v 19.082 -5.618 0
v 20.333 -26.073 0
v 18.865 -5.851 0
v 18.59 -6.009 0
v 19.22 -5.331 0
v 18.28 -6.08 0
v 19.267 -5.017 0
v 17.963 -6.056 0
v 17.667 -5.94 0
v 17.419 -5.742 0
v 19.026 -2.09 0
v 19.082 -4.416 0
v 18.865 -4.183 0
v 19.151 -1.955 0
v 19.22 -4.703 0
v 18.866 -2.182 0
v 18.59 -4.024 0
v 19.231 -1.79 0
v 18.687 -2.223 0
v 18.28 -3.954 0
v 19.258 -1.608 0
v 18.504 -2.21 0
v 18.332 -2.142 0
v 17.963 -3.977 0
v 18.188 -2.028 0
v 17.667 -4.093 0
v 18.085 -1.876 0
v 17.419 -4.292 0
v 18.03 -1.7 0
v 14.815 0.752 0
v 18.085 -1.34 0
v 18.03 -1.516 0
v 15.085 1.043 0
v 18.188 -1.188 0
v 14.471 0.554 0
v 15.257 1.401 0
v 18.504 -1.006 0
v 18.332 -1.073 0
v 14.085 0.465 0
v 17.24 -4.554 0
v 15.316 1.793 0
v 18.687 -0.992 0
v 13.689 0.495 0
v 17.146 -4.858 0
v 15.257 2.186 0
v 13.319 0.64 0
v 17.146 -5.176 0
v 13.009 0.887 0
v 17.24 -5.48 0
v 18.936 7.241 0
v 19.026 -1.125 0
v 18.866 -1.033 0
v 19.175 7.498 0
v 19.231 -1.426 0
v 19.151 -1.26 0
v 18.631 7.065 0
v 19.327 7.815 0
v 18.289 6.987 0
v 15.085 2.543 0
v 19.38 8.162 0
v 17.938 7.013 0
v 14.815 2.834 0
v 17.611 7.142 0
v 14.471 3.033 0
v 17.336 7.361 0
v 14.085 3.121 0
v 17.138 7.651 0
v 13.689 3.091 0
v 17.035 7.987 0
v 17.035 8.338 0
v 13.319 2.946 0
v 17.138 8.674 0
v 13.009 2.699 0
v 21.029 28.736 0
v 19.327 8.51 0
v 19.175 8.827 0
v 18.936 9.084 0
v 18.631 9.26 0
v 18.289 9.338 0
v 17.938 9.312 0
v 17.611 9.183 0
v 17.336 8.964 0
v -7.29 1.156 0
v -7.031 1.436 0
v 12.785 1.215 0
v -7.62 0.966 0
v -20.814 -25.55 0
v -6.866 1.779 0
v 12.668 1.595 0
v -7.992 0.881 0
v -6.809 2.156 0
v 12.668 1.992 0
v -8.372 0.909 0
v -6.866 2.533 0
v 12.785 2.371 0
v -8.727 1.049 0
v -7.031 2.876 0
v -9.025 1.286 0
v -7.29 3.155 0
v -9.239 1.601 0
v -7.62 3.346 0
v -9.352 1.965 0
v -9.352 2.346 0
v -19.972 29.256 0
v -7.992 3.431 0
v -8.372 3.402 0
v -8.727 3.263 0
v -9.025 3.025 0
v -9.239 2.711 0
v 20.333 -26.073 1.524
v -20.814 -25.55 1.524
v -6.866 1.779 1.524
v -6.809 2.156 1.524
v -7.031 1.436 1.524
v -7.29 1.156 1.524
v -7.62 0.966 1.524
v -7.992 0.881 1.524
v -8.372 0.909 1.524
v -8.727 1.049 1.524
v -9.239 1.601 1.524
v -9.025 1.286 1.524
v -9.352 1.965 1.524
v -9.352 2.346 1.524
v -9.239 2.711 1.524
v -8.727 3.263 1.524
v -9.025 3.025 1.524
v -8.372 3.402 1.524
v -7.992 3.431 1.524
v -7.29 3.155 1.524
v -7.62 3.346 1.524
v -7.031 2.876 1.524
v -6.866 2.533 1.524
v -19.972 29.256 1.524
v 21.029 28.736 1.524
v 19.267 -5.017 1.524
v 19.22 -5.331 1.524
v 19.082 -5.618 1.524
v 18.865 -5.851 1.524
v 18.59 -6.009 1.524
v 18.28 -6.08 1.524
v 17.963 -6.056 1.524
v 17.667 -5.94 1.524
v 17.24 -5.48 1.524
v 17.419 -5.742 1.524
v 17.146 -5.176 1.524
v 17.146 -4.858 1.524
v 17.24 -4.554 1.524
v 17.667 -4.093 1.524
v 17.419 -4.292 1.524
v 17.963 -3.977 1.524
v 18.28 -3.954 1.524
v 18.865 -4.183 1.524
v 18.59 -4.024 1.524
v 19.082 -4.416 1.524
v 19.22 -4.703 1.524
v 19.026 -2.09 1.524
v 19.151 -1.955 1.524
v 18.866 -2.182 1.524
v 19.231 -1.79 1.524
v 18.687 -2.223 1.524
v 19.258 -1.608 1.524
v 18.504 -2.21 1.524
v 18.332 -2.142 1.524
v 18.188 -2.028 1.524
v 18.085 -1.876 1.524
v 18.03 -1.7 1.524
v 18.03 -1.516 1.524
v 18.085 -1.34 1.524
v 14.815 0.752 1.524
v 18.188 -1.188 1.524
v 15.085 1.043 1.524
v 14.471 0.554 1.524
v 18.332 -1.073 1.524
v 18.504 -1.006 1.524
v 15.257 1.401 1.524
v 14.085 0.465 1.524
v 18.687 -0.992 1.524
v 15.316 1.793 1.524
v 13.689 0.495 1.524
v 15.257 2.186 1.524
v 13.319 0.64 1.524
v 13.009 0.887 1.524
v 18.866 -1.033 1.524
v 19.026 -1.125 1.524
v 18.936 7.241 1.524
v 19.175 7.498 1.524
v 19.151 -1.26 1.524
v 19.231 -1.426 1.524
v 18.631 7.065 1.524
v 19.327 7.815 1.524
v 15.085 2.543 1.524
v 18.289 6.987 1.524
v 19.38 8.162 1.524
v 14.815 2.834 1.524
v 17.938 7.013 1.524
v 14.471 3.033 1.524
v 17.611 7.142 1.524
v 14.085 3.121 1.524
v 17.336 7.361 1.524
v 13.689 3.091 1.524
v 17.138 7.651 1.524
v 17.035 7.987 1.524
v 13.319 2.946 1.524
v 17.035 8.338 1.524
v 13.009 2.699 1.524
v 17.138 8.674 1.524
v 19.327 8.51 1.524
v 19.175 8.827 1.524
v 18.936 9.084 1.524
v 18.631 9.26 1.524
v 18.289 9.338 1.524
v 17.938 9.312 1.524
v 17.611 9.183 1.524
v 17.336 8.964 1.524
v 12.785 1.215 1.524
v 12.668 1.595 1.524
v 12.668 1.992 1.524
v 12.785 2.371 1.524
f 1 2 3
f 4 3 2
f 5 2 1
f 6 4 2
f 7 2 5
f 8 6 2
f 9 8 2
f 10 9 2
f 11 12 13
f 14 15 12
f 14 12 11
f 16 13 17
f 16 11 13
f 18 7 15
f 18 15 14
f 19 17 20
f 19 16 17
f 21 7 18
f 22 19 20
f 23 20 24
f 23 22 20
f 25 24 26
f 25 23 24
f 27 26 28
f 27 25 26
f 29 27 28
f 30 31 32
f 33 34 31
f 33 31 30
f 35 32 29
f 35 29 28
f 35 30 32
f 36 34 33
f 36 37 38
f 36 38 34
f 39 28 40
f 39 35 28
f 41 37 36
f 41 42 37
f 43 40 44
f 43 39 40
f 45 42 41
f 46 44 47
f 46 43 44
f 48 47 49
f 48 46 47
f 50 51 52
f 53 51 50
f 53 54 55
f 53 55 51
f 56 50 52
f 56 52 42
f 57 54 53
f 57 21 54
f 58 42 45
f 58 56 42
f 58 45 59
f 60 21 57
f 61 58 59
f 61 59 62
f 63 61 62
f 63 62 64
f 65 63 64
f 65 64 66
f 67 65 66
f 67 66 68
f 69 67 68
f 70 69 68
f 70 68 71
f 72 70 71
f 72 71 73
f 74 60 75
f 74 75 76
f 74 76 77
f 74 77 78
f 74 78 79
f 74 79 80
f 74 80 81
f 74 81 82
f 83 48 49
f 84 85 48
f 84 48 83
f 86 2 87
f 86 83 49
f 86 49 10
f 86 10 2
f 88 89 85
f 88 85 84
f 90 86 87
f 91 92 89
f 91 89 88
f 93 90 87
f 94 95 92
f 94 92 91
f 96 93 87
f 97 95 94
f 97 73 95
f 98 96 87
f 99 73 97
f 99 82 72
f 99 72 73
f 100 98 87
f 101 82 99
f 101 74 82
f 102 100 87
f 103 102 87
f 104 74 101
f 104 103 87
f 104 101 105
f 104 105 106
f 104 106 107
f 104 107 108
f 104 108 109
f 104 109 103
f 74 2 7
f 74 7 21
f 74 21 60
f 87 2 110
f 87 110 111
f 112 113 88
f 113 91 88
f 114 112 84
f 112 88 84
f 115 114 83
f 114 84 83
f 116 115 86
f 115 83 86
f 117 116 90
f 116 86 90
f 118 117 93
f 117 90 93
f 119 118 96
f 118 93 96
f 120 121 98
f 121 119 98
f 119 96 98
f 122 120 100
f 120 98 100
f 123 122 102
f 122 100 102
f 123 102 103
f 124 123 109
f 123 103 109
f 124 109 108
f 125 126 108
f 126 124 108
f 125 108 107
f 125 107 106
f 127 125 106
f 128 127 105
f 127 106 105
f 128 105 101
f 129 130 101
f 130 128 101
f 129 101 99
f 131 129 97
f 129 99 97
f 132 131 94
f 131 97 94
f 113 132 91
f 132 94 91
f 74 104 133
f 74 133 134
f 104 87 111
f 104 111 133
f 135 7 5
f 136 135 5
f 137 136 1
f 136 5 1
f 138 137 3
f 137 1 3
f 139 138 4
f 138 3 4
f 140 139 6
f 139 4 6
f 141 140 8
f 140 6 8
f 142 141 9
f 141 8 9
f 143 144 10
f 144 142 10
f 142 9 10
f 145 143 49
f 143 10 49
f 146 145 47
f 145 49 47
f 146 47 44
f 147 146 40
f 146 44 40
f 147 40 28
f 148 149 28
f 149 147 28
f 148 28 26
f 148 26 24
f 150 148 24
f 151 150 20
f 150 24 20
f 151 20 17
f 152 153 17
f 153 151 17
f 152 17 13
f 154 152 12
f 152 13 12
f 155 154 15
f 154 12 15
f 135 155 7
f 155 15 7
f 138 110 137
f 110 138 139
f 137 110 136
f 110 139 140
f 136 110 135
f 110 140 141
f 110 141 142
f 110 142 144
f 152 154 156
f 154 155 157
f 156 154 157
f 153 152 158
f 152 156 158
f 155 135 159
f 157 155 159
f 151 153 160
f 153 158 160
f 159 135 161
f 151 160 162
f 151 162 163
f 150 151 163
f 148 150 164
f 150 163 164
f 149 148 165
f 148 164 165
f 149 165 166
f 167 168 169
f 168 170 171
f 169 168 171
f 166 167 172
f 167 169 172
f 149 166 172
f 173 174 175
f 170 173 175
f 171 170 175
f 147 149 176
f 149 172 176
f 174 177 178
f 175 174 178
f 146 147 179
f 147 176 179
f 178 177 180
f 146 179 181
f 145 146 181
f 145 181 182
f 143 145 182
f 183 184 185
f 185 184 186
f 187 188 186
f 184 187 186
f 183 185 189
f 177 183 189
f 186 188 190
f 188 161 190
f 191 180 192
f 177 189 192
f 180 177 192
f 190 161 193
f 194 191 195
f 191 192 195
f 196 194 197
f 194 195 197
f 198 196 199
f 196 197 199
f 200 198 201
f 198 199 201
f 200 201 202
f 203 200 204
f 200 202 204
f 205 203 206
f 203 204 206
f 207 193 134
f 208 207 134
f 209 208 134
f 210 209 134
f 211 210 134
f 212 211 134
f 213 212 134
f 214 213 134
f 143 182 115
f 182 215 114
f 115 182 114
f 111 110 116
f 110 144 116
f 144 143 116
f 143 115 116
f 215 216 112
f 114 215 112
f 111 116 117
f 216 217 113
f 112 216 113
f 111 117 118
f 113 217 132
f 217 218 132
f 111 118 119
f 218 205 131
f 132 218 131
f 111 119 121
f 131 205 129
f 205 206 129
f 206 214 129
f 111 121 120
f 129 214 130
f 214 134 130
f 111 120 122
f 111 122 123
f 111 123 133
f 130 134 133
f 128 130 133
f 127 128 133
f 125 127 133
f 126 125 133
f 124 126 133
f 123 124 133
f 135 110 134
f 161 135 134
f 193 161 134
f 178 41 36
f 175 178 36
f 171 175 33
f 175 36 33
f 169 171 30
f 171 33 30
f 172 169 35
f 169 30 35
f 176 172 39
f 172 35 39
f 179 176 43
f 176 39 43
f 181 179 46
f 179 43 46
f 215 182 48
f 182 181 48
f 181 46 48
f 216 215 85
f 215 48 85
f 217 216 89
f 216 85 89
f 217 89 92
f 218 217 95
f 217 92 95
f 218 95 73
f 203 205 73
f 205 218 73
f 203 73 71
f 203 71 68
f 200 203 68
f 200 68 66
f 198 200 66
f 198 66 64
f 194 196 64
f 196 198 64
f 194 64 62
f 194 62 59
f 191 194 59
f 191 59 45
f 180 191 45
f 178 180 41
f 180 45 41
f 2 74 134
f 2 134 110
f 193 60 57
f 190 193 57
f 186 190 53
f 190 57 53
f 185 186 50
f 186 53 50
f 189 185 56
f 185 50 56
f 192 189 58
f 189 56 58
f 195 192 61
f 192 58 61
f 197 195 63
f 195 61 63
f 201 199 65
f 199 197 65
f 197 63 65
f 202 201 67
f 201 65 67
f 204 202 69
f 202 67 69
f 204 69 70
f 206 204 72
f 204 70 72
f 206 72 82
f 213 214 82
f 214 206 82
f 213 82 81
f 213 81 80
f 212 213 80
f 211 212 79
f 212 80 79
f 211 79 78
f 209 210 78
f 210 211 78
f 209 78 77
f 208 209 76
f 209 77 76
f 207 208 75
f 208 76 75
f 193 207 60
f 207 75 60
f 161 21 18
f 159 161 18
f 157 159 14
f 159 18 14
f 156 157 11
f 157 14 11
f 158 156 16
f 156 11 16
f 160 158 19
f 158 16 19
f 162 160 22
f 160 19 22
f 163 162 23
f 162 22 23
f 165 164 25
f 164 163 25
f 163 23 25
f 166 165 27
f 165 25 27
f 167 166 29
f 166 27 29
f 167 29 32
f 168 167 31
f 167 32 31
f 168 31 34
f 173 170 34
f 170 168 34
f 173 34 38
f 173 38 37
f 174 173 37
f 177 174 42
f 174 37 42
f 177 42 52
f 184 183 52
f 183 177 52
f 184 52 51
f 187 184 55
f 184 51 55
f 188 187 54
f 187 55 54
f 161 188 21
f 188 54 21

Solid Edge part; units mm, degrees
sketch "Sketch1" plane through (0, 0, 0) normal (0, 0, 1) x (1, 0, 0)
  line L0 (-20.8143, -25.5503) -> (-19.9719, 29.256)
  line L1 (-19.9719, 29.256) -> (21.029, 28.7357)
  line L2 (21.029, 28.7357) -> (20.3333, -26.0726)
  line L3 (20.3333, -26.0726) -> (-20.8143, -25.5503)
  circle A0 centre (-8.0875, 2.1558) radius 1.2785
  circle A1 centre (18.2006, -5.0169) radius 1.0663
  circle A2 centre (18.2006, 8.1625) radius 1.1789
  circle A3 centre (18.6409, -1.6077) radius 0.6174
  circle A4 centre (13.985, 1.7931) radius 1.3315
extrude "ExtrudedProtrusion_1" add sketch "Sketch1" along normal blind 1.524
